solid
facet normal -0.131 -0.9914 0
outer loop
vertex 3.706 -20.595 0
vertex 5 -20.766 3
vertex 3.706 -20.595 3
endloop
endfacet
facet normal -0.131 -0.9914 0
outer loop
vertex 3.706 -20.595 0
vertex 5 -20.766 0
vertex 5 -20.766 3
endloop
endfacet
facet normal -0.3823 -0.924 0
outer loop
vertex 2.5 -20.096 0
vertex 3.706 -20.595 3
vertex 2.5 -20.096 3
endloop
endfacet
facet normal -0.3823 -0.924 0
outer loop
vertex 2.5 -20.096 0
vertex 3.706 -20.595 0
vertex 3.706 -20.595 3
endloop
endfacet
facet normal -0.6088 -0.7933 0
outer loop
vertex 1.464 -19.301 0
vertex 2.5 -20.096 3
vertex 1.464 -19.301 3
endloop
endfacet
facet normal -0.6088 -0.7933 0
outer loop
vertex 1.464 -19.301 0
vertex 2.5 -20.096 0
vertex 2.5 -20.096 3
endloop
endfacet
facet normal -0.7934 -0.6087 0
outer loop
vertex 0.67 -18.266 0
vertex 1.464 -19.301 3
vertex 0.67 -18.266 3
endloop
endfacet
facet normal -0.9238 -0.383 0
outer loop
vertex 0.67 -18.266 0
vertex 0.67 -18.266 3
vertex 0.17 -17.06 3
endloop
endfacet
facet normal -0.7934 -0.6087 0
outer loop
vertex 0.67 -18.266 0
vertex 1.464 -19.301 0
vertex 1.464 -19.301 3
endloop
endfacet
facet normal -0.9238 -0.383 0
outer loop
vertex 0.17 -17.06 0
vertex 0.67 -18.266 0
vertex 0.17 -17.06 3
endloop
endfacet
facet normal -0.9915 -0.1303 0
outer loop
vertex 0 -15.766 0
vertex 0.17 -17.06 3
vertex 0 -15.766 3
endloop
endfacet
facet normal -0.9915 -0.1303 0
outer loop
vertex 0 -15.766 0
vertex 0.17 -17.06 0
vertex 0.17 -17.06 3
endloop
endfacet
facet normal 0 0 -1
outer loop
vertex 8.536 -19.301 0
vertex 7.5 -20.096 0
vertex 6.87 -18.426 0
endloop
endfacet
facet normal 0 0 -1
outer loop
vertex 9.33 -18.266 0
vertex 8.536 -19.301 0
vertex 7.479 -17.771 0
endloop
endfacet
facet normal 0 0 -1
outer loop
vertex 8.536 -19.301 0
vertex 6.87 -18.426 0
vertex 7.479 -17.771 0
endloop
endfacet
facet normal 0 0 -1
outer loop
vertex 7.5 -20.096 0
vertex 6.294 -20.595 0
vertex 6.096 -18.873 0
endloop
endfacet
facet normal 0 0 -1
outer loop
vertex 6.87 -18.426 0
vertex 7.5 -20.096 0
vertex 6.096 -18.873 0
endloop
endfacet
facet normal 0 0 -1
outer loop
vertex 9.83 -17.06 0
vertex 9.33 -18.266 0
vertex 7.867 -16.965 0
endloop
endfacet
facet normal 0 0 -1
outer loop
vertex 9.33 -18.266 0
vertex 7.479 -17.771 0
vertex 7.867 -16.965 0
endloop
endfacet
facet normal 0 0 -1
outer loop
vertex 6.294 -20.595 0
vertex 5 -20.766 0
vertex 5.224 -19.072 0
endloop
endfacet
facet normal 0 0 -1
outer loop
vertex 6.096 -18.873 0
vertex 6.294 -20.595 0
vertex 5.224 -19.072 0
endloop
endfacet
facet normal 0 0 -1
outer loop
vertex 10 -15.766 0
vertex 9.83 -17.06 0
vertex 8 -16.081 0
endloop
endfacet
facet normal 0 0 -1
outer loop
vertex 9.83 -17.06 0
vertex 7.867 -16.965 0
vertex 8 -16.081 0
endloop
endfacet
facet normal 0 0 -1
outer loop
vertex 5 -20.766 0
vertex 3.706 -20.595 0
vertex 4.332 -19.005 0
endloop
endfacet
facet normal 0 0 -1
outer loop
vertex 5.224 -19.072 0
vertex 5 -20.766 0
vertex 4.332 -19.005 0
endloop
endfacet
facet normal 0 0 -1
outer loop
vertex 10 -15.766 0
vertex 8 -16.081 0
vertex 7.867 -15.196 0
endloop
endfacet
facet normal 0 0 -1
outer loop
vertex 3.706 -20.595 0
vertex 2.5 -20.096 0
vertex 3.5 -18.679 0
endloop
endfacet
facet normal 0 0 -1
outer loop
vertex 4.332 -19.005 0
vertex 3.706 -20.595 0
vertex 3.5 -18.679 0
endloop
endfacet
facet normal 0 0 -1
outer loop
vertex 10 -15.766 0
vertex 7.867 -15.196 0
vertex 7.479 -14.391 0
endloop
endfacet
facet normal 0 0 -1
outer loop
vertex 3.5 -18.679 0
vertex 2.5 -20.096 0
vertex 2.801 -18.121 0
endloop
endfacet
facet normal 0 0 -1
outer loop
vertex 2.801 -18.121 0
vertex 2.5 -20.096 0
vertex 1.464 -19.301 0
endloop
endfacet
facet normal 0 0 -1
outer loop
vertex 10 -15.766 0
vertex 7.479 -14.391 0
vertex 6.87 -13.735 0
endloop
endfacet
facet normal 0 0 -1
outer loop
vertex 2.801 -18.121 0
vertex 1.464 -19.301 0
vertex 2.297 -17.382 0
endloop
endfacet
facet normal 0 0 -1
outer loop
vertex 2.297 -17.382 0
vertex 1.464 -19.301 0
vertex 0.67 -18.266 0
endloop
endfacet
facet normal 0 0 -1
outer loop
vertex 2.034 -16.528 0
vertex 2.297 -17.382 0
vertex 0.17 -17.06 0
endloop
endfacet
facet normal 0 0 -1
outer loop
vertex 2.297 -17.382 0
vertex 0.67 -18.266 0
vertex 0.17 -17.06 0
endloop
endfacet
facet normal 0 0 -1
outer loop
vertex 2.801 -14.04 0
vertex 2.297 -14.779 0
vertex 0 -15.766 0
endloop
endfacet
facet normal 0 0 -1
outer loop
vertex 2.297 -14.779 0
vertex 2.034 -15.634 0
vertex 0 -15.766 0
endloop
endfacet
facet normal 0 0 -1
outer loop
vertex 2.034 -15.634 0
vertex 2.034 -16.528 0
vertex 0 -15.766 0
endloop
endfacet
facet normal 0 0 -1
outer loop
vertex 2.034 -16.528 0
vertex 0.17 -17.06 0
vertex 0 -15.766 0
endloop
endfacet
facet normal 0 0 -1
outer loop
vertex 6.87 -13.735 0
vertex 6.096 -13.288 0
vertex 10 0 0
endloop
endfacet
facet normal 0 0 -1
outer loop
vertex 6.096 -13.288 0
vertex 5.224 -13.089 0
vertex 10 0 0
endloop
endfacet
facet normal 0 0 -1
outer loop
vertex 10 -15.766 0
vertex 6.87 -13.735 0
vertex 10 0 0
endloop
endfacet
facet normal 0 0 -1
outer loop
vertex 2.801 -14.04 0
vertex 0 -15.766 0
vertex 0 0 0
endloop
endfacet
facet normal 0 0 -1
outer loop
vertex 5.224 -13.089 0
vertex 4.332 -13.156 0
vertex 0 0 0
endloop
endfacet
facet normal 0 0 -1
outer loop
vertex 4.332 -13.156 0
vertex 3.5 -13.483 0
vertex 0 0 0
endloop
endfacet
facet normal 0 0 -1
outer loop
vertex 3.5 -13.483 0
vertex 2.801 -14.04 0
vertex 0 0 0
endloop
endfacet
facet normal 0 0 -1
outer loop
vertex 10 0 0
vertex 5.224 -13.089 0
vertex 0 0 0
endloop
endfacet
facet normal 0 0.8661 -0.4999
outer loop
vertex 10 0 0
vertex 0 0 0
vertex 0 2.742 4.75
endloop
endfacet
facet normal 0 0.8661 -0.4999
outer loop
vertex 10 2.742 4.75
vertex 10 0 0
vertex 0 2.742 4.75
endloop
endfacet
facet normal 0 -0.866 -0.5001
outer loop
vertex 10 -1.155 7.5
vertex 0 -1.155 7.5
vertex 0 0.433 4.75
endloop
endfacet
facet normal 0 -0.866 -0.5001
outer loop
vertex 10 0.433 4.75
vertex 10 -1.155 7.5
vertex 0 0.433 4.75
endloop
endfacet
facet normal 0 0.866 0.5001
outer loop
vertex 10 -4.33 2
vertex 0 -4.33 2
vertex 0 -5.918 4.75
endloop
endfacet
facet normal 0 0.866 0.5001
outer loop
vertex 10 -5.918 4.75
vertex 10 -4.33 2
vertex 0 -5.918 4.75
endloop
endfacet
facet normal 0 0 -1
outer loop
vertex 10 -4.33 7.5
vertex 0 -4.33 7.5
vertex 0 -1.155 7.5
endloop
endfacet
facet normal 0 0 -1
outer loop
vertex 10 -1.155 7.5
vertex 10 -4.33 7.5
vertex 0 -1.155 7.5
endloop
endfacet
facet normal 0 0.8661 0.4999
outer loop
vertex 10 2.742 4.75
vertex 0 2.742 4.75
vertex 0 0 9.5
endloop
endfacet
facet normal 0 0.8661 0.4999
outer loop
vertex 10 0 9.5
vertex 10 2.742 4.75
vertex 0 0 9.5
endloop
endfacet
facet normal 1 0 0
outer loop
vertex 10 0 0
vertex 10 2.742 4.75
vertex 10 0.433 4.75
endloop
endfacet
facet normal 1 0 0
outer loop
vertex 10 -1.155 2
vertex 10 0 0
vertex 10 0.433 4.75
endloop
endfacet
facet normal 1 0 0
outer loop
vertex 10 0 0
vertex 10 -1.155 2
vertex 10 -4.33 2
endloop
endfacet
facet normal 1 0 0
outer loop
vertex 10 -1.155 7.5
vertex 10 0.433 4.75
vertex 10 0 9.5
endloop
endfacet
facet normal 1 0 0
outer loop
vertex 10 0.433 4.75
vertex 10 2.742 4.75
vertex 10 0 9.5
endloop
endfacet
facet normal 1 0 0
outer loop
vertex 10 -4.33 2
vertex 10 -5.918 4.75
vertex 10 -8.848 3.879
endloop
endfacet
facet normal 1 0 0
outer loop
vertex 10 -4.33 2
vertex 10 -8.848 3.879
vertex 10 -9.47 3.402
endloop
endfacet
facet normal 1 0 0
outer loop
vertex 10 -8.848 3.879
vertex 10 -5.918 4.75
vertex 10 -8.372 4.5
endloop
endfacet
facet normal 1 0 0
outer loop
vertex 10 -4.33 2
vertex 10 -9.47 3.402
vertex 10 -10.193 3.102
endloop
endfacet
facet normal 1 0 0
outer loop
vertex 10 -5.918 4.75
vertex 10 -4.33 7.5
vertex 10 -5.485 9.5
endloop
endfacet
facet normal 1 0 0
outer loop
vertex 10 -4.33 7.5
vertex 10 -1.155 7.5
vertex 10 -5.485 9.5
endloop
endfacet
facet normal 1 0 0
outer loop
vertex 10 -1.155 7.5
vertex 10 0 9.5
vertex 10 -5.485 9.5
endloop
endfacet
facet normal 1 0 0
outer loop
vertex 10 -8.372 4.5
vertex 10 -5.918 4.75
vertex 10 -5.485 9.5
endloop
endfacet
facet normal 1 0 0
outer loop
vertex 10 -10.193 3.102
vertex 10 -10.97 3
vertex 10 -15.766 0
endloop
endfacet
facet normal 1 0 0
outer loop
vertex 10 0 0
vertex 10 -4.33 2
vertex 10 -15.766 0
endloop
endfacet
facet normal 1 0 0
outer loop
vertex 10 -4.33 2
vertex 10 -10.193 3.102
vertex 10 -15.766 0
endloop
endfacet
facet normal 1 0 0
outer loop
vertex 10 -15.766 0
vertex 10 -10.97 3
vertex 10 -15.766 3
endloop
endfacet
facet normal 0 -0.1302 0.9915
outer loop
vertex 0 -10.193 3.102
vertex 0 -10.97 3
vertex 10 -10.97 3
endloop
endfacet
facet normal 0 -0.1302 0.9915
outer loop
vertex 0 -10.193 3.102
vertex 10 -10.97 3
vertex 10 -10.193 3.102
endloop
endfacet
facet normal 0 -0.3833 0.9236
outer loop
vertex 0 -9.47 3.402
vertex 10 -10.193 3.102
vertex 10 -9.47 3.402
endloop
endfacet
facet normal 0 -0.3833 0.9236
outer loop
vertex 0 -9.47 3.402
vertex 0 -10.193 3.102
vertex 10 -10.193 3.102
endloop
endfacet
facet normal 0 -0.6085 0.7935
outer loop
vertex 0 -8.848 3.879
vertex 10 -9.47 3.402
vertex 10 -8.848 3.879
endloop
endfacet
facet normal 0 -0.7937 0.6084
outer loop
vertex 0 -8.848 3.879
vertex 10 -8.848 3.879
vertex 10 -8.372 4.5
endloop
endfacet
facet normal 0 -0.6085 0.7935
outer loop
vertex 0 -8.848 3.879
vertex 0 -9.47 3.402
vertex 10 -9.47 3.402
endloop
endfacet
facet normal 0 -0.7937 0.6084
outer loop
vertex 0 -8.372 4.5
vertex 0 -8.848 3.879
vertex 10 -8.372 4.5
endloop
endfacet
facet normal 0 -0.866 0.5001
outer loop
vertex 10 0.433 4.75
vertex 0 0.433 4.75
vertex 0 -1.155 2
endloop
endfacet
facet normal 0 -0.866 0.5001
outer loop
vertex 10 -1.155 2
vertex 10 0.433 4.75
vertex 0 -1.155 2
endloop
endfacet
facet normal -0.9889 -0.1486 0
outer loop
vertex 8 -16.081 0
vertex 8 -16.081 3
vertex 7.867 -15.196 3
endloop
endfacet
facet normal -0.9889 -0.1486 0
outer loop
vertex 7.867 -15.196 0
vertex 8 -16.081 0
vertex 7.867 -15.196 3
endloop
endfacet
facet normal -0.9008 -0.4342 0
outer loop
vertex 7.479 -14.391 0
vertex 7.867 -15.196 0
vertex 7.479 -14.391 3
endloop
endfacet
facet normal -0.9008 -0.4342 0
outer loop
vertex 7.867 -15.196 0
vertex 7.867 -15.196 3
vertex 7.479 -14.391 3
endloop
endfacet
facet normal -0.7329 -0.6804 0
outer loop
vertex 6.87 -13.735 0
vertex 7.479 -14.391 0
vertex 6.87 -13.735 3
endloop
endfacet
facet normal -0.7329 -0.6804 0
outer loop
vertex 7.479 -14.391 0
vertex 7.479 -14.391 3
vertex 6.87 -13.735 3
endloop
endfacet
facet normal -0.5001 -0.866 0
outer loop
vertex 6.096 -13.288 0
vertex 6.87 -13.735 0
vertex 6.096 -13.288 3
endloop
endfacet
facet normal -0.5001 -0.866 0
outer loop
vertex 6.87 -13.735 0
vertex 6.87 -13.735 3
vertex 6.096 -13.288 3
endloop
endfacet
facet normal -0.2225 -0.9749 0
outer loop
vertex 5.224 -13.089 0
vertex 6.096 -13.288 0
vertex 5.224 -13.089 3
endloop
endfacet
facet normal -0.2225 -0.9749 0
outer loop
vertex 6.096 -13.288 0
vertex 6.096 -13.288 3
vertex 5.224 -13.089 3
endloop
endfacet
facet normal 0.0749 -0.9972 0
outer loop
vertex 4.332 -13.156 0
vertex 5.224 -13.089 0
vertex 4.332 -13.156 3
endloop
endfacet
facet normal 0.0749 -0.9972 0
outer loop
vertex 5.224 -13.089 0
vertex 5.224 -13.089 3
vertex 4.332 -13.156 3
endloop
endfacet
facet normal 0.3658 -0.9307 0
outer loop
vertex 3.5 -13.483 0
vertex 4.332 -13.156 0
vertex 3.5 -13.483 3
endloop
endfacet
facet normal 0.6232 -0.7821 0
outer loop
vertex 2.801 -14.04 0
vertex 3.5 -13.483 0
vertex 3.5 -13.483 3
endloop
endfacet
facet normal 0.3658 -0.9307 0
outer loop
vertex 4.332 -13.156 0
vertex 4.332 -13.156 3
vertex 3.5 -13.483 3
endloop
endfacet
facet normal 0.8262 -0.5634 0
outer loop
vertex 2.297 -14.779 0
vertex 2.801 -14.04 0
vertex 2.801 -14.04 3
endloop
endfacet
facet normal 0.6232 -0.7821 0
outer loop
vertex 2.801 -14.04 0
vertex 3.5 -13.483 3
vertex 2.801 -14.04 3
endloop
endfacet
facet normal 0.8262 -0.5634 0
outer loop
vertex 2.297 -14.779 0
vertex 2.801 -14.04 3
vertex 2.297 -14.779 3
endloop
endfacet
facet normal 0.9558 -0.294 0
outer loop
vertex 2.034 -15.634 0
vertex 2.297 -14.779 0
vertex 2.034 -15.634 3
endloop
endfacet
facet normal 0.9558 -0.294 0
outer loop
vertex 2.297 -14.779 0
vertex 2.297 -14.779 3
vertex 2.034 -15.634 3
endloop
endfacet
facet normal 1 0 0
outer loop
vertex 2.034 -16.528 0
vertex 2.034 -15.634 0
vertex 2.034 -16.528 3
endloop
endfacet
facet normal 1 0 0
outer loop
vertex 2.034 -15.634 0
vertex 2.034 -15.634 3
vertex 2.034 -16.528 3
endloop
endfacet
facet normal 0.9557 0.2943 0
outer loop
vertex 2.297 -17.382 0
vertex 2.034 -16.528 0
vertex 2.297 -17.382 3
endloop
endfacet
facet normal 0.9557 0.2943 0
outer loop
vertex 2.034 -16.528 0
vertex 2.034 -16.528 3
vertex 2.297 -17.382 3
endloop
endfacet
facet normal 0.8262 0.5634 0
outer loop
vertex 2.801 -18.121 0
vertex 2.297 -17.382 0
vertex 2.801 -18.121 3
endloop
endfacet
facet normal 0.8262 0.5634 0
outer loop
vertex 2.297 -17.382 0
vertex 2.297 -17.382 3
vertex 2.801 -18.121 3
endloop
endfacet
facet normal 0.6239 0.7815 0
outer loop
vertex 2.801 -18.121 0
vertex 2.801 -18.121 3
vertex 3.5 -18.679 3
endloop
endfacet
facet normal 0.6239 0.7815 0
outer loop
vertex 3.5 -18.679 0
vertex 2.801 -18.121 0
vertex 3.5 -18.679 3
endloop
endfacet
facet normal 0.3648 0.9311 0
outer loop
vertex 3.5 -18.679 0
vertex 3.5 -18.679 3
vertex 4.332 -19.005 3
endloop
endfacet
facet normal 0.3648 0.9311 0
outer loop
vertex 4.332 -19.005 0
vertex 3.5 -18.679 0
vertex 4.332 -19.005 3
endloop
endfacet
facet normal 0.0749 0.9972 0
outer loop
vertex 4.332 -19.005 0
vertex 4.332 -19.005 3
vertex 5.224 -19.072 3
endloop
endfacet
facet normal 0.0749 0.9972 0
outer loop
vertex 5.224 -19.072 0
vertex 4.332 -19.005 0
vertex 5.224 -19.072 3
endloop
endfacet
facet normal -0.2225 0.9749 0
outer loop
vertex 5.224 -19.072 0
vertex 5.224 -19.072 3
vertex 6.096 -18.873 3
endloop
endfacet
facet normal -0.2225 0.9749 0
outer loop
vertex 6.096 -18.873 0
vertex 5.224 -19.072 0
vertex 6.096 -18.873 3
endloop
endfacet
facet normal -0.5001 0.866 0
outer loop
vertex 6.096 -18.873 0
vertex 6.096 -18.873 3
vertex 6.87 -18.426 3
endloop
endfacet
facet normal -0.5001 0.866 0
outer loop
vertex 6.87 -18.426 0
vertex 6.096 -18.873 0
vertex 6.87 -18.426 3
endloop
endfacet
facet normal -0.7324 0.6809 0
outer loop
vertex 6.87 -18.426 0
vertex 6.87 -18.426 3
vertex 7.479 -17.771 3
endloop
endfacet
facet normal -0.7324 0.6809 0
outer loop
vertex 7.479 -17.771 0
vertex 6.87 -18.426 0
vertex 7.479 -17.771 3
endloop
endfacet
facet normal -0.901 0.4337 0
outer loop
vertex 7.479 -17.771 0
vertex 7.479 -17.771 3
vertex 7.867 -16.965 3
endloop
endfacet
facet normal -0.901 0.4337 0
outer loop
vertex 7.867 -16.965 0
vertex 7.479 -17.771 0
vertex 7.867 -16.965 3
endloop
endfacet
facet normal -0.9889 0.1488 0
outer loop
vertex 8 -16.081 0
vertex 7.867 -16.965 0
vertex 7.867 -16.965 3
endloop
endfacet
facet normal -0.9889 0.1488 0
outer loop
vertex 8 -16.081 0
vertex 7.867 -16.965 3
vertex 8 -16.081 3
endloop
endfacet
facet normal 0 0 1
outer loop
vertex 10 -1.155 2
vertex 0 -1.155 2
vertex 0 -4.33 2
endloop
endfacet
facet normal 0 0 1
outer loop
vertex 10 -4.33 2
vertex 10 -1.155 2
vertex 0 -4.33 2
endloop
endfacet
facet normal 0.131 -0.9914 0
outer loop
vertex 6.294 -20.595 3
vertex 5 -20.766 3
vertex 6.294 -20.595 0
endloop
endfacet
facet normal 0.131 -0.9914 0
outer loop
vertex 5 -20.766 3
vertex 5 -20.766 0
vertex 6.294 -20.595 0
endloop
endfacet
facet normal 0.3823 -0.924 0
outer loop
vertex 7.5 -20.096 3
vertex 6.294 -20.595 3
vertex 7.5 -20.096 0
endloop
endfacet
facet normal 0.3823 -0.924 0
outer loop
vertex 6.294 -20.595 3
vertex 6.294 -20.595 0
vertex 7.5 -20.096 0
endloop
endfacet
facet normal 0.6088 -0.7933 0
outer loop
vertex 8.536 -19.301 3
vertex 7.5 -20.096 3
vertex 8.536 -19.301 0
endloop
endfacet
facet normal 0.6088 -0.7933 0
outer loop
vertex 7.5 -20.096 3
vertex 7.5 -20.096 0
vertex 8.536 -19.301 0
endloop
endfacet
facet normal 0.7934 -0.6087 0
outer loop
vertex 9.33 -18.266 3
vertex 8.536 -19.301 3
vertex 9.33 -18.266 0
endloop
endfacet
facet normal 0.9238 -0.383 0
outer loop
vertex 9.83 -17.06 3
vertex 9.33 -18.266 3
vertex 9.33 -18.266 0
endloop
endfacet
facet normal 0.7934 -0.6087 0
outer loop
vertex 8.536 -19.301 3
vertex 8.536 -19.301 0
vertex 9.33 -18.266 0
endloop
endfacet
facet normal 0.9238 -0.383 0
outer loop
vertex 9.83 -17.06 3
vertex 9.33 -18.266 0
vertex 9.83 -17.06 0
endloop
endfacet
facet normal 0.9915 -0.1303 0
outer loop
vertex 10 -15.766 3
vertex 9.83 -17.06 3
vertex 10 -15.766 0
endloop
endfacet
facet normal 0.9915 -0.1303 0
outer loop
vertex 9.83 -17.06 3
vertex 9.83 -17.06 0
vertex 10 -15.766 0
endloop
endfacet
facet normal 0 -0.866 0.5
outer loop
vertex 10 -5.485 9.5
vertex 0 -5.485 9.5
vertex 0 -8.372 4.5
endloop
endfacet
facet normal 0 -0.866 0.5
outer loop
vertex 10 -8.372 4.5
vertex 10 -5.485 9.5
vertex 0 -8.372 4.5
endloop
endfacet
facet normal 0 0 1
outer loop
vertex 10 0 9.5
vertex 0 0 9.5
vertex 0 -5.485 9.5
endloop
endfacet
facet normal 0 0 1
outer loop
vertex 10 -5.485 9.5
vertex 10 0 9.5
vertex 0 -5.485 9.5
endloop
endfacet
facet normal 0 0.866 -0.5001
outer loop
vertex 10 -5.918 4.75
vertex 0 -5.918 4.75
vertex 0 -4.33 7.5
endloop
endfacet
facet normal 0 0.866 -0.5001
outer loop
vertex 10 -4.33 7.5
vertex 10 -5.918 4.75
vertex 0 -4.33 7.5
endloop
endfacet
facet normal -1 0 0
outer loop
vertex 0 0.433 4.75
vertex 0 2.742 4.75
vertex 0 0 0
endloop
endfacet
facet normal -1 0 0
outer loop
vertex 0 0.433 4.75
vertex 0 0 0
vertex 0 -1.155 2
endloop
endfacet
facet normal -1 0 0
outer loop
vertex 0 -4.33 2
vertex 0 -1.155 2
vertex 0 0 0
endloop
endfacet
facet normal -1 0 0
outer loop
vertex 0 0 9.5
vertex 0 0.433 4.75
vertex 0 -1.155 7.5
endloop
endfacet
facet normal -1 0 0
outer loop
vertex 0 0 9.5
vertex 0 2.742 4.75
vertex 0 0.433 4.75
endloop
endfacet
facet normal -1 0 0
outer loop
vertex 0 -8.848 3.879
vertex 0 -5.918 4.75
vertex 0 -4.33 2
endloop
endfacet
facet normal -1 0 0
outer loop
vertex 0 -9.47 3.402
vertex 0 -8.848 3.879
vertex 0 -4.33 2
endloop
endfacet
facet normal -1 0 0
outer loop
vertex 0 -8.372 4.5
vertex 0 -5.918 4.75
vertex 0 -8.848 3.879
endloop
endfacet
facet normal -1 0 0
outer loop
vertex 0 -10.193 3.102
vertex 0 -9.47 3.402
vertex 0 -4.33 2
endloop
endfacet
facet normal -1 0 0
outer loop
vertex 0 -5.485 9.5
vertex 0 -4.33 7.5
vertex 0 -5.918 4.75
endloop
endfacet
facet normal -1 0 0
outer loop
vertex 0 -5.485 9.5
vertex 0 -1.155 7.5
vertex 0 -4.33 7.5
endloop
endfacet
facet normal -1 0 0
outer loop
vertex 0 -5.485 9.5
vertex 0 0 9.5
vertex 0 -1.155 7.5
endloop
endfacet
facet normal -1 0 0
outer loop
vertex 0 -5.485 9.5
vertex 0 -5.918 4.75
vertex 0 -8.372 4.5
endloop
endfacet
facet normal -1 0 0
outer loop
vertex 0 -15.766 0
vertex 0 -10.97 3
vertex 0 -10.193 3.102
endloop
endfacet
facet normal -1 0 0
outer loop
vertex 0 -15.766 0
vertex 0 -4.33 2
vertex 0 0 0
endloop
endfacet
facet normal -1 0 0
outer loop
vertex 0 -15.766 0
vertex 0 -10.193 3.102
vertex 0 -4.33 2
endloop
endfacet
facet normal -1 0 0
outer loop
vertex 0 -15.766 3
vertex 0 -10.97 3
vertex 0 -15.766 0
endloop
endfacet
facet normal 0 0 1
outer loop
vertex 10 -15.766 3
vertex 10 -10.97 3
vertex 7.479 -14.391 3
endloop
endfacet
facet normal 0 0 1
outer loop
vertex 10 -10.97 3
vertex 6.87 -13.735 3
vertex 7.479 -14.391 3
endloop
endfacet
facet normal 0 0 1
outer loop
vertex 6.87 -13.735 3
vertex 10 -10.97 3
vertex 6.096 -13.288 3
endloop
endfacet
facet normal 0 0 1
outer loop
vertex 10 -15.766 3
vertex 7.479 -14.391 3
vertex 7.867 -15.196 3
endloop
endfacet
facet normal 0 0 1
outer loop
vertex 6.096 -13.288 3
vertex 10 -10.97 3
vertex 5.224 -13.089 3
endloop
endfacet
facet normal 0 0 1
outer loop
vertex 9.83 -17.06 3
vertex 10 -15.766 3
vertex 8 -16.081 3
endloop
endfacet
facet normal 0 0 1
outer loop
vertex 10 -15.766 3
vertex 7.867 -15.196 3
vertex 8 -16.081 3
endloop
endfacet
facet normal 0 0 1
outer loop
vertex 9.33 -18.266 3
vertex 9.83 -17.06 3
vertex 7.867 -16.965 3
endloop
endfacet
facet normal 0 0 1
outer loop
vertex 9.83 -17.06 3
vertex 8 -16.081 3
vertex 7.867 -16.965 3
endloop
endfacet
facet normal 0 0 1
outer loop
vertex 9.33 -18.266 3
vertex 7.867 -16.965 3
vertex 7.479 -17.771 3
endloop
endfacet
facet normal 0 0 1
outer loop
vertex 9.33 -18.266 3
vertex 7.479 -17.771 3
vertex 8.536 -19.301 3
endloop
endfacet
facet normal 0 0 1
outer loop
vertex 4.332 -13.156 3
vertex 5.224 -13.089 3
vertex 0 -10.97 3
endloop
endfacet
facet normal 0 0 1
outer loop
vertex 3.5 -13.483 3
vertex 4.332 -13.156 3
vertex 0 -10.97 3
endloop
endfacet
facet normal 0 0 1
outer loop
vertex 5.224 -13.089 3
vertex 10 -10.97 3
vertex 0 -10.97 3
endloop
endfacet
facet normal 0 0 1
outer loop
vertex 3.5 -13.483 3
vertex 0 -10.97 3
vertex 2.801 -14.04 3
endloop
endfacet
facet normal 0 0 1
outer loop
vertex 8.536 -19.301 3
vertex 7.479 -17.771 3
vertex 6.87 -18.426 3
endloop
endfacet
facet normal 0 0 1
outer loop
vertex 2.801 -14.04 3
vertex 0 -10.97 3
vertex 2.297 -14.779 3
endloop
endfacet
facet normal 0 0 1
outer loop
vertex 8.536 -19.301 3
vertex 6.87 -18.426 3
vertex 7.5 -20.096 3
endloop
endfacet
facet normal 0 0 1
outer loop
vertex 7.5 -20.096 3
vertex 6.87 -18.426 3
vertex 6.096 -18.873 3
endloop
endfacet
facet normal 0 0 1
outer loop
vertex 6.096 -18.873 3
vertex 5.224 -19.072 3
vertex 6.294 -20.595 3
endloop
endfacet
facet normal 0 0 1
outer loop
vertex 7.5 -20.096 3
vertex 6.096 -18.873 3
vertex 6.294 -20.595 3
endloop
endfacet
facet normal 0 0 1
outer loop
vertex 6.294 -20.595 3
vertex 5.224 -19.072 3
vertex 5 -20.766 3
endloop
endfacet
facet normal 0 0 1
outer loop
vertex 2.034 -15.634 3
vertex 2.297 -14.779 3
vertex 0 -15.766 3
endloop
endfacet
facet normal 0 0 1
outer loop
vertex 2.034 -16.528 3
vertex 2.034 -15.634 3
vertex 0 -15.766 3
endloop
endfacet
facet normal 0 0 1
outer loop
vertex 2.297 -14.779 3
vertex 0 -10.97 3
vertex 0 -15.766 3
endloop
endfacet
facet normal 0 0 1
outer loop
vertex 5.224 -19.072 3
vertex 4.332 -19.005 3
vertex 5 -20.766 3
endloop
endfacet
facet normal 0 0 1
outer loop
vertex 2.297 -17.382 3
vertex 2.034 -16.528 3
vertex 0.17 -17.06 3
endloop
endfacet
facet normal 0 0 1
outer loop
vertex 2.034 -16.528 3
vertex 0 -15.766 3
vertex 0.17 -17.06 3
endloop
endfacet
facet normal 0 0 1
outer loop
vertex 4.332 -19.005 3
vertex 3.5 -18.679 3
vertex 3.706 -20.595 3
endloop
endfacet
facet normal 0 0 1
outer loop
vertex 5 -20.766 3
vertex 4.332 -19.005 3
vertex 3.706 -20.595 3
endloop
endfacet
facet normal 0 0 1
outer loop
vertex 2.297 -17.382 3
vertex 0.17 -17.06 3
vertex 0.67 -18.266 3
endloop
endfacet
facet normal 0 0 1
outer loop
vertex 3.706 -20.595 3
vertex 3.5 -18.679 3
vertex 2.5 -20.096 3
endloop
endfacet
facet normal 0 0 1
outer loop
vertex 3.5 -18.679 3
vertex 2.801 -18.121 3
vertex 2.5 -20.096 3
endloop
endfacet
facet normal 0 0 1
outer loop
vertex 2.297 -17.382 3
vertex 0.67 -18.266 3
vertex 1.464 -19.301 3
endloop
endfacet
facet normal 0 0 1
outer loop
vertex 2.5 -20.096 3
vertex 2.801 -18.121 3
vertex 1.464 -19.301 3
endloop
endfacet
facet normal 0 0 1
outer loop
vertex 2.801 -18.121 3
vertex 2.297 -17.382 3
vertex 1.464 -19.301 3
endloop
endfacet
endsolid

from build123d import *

# Parameters (mm, degrees)
F1_DEPTH    = 10
F2_R        = 3
F3_DEPTH    = 25
F4_R        = 4.99999
F5_T1_DEPTH = 10


# Not quite as in the source:
# - a fillet or chamfer that OpenCascade refuses, or shapes differently, is made with other operations: its cross-section is extruded or revolved along the edge and cut away or added
# - a fillet or chamfer is up to 0.001 mm smaller than in the source, because OpenCascade refuses the exact size


with BuildPart() as f1:
    # F0 (on Right) → F1 (new body)
    with BuildSketch(Plane.YZ):
        Polygon((-20.7655076647, 0), (0, 0), (2.7424137787, 4.75), (0, 9.5), (-5.4848275573, 9.5), (-8.3715789032, 4.5), (-8.3715789032, 3), (-20.7655076647, 3), align=None)
        Polygon((-4.3301270189, 2), (-5.9178402592, 4.75), (-4.3301270189, 7.5), (-1.1547005384, 7.5), (0.4330127019, 4.75), (-1.1547005384, 2), align=None, mode=Mode.SUBTRACT)
    extrude(amount=F1_DEPTH)

    # F2 (on face) → F3 (cut)
    with BuildSketch(Plane.XY.offset(3)):
        with Locations((5, -16.0806495696)):
            Circle(F2_R)
    extrude(amount=-F3_DEPTH, mode=Mode.SUBTRACT)

    # F4 (radius 5 in the source; OpenCascade refuses exactly that, so slightly less here)
    f4_edges = [f1.edges().sort_by_distance(p)[0] for p in [
        (0, -20.765508, 1.5),
        (10, -20.765508, 1.5),
    ]]
    fillet(f4_edges, radius=F4_R)

    # F5: fillet of radius 3 on 1 edges, made by hand

    # F5_s2 → F5_t1 (join)
    with BuildSketch(Plane.YZ):
        with BuildLine():
            ThreePointArc((-10.9696551146, 3), (-9.4696551146, 3.4019237886), (-8.3715789032, 4.5))
            Line((-8.3715789032, 4.5), (-8.3715789032, 3))
            Line((-8.3715789032, 3), (-10.9696551146, 3))
        make_face()
    extrude(amount=F5_T1_DEPTH)


solid = f1.part
